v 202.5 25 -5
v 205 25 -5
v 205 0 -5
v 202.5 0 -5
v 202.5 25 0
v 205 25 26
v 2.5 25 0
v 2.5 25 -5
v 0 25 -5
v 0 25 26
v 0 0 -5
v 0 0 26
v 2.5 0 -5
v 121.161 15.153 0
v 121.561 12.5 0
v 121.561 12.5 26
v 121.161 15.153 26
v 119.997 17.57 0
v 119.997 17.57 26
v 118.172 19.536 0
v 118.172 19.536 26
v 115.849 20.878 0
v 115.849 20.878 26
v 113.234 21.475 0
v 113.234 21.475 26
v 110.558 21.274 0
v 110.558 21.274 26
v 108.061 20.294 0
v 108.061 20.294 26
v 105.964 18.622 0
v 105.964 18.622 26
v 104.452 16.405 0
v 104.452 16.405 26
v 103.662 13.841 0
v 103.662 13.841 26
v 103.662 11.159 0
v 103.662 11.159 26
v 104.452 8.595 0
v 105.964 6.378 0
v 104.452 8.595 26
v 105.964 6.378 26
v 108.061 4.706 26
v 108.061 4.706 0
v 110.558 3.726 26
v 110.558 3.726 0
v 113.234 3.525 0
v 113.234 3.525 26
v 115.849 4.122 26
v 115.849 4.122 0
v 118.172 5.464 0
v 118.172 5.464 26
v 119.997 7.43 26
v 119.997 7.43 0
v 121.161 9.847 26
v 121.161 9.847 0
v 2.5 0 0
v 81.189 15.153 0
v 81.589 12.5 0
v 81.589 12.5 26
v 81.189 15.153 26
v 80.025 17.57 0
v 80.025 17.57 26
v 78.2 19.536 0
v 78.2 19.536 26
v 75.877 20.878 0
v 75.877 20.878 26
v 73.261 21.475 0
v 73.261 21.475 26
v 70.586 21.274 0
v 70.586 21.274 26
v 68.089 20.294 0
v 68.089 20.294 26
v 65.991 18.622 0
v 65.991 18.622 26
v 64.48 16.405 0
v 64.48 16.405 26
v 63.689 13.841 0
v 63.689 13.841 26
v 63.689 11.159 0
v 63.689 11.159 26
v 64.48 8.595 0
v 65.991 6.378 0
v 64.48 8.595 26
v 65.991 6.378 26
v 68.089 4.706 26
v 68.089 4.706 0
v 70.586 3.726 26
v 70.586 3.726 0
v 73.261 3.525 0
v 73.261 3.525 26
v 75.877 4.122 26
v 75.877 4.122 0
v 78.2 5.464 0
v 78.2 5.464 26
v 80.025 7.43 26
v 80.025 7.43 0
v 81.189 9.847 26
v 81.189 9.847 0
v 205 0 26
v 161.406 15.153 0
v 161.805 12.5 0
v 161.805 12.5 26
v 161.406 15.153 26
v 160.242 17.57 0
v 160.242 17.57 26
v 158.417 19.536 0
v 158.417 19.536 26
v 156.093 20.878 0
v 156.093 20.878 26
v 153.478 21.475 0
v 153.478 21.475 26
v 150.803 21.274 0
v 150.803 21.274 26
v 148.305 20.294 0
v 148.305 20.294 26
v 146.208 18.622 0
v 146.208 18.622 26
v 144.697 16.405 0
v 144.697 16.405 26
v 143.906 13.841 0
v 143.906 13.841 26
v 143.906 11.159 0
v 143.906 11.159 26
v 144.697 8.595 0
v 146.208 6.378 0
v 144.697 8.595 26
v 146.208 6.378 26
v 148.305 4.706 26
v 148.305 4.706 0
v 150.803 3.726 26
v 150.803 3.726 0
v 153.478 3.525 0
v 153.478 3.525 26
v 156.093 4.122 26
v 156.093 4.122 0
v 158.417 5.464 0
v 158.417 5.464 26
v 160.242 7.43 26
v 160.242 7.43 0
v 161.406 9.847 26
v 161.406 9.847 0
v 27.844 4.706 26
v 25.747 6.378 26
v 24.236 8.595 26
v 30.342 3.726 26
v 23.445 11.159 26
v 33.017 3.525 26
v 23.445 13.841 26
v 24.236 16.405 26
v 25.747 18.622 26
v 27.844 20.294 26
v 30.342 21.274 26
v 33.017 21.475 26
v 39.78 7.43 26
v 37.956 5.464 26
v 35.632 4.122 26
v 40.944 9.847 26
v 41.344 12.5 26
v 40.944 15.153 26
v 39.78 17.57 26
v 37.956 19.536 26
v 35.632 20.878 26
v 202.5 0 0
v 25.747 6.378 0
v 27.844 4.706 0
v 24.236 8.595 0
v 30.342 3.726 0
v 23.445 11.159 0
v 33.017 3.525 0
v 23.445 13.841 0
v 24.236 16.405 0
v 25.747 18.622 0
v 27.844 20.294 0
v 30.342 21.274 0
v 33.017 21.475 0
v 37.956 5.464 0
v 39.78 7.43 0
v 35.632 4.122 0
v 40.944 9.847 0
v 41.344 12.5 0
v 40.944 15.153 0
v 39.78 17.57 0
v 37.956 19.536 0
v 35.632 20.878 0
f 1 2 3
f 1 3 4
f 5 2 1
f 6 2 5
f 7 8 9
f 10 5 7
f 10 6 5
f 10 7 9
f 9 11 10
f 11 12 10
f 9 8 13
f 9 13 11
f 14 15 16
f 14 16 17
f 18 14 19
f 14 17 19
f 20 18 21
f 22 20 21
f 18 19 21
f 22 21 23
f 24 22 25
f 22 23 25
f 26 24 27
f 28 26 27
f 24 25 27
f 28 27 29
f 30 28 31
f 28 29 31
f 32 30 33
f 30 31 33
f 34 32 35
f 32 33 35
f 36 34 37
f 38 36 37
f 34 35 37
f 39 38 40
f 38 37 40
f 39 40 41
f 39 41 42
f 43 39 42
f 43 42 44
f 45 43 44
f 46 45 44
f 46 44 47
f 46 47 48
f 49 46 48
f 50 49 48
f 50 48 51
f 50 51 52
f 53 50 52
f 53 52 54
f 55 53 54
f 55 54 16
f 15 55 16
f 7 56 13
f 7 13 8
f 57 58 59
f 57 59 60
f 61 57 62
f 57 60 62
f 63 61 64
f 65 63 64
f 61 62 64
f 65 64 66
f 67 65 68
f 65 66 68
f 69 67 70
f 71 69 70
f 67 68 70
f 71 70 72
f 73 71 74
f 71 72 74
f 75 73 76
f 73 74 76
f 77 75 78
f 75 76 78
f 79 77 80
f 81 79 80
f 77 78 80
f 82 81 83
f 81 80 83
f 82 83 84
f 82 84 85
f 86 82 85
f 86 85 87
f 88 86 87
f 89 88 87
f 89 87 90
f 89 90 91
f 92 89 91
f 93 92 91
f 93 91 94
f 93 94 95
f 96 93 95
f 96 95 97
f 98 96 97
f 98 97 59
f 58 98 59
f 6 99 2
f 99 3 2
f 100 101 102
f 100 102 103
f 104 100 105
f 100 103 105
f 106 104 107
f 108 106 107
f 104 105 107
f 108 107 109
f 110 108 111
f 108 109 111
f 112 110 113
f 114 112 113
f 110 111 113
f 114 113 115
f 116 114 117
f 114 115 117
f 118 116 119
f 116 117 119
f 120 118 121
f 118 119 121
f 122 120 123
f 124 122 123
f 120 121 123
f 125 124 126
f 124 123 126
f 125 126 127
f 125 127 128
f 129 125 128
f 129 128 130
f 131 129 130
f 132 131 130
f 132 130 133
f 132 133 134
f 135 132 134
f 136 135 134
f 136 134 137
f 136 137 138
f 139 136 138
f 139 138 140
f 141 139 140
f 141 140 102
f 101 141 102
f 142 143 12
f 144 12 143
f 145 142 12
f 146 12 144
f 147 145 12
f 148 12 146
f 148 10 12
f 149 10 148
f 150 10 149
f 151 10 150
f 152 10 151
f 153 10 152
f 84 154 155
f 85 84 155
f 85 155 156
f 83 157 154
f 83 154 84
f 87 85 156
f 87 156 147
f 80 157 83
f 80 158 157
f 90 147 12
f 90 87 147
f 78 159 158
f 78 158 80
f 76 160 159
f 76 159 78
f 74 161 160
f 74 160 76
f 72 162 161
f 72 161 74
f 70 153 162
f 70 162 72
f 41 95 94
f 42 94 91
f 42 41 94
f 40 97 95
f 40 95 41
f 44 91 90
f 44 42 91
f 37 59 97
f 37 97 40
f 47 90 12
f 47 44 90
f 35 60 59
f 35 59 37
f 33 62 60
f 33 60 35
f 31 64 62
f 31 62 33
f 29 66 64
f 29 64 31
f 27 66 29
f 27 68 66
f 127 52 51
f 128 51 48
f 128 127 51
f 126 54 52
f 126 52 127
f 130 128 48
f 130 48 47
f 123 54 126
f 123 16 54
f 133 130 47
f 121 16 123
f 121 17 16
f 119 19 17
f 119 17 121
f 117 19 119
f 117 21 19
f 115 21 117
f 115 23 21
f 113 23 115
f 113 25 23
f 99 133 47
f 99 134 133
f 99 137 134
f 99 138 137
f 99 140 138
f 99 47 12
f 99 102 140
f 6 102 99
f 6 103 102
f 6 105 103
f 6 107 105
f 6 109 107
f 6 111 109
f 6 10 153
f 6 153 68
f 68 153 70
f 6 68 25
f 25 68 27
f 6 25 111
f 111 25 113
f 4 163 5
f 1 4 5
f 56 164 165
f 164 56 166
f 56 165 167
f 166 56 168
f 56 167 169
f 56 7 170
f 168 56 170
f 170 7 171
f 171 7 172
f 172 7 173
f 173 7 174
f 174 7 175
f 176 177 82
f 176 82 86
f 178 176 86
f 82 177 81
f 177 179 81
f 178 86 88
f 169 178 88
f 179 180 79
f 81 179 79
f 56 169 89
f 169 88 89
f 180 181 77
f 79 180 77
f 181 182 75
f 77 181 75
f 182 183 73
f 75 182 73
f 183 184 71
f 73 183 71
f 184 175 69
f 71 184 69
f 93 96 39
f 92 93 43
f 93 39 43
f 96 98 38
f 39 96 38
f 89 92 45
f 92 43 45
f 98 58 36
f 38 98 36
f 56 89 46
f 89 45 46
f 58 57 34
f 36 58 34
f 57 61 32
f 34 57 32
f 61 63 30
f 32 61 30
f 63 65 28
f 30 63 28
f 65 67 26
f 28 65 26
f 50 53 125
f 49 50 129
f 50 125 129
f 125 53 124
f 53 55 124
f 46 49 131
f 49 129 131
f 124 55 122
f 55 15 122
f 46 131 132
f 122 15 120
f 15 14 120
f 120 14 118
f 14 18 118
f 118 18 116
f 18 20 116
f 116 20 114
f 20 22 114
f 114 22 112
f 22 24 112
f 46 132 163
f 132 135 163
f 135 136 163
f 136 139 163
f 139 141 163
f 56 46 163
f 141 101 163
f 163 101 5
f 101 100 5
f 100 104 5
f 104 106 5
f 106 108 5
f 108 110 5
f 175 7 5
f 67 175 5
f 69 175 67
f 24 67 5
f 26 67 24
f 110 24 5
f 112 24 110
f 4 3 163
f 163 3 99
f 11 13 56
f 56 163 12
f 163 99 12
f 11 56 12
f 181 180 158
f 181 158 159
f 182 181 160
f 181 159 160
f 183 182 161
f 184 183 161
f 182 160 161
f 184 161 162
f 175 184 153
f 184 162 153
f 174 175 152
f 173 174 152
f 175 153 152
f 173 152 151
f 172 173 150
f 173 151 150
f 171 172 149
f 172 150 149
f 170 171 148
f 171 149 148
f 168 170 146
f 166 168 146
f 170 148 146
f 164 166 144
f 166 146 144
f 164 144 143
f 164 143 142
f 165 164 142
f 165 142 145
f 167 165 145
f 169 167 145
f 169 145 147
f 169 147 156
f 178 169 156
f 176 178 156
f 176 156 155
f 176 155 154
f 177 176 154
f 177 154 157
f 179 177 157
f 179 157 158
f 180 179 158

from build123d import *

# Parameters (mm, degrees)
SKIZZE1_W                        = 205
SKIZZE1_H                        = 25
AUFSATZ_LINEAR_AUSTRAGEN1_DEPTH  = 26
SKIZZE2_W                        = 2.5
SKIZZE2_H                        = 25
AUFSATZ_LINEAR_AUSTRAGEN2_DEPTH  = 5
F_18_0_18_DURCHMESSER_BOHRUNG1_D = 18


with BuildPart() as part:
    # Skizze1 → Aufsatz-Linear austragen1 (new body)
    with BuildSketch(Plane.XY):
        with Locations((102.5, 12.5)):
            Rectangle(SKIZZE1_W, SKIZZE1_H)
    extrude(amount=AUFSATZ_LINEAR_AUSTRAGEN1_DEPTH)

    # Skizze2 → Aufsatz-Linear austragen2 (add)
    with BuildSketch(Plane(origin=(0, 0, 0), x_dir=(-1, 0, 0), z_dir=(0, 0, -1))):
        with Locations((-1.25, 12.5)):
            Rectangle(SKIZZE2_W, SKIZZE2_H)
        with Locations((-203.75, 12.5)):
            Rectangle(SKIZZE2_W, SKIZZE2_H)
    extrude(amount=AUFSATZ_LINEAR_AUSTRAGEN2_DEPTH)

    # Ø18.0 (18) Durchmesser Bohrung1 (through all)
    with Locations(Plane(origin=(0, 0, 0), x_dir=(-1, 0, 0), z_dir=(0, 0, -1))):
        with Locations((-32.344324412, 12.5), (-72.588665447, 12.5), (-112.561085259, 12.5), (-152.805426293, 12.5)):
            Hole(F_18_0_18_DURCHMESSER_BOHRUNG1_D / 2)


solid = part.part
